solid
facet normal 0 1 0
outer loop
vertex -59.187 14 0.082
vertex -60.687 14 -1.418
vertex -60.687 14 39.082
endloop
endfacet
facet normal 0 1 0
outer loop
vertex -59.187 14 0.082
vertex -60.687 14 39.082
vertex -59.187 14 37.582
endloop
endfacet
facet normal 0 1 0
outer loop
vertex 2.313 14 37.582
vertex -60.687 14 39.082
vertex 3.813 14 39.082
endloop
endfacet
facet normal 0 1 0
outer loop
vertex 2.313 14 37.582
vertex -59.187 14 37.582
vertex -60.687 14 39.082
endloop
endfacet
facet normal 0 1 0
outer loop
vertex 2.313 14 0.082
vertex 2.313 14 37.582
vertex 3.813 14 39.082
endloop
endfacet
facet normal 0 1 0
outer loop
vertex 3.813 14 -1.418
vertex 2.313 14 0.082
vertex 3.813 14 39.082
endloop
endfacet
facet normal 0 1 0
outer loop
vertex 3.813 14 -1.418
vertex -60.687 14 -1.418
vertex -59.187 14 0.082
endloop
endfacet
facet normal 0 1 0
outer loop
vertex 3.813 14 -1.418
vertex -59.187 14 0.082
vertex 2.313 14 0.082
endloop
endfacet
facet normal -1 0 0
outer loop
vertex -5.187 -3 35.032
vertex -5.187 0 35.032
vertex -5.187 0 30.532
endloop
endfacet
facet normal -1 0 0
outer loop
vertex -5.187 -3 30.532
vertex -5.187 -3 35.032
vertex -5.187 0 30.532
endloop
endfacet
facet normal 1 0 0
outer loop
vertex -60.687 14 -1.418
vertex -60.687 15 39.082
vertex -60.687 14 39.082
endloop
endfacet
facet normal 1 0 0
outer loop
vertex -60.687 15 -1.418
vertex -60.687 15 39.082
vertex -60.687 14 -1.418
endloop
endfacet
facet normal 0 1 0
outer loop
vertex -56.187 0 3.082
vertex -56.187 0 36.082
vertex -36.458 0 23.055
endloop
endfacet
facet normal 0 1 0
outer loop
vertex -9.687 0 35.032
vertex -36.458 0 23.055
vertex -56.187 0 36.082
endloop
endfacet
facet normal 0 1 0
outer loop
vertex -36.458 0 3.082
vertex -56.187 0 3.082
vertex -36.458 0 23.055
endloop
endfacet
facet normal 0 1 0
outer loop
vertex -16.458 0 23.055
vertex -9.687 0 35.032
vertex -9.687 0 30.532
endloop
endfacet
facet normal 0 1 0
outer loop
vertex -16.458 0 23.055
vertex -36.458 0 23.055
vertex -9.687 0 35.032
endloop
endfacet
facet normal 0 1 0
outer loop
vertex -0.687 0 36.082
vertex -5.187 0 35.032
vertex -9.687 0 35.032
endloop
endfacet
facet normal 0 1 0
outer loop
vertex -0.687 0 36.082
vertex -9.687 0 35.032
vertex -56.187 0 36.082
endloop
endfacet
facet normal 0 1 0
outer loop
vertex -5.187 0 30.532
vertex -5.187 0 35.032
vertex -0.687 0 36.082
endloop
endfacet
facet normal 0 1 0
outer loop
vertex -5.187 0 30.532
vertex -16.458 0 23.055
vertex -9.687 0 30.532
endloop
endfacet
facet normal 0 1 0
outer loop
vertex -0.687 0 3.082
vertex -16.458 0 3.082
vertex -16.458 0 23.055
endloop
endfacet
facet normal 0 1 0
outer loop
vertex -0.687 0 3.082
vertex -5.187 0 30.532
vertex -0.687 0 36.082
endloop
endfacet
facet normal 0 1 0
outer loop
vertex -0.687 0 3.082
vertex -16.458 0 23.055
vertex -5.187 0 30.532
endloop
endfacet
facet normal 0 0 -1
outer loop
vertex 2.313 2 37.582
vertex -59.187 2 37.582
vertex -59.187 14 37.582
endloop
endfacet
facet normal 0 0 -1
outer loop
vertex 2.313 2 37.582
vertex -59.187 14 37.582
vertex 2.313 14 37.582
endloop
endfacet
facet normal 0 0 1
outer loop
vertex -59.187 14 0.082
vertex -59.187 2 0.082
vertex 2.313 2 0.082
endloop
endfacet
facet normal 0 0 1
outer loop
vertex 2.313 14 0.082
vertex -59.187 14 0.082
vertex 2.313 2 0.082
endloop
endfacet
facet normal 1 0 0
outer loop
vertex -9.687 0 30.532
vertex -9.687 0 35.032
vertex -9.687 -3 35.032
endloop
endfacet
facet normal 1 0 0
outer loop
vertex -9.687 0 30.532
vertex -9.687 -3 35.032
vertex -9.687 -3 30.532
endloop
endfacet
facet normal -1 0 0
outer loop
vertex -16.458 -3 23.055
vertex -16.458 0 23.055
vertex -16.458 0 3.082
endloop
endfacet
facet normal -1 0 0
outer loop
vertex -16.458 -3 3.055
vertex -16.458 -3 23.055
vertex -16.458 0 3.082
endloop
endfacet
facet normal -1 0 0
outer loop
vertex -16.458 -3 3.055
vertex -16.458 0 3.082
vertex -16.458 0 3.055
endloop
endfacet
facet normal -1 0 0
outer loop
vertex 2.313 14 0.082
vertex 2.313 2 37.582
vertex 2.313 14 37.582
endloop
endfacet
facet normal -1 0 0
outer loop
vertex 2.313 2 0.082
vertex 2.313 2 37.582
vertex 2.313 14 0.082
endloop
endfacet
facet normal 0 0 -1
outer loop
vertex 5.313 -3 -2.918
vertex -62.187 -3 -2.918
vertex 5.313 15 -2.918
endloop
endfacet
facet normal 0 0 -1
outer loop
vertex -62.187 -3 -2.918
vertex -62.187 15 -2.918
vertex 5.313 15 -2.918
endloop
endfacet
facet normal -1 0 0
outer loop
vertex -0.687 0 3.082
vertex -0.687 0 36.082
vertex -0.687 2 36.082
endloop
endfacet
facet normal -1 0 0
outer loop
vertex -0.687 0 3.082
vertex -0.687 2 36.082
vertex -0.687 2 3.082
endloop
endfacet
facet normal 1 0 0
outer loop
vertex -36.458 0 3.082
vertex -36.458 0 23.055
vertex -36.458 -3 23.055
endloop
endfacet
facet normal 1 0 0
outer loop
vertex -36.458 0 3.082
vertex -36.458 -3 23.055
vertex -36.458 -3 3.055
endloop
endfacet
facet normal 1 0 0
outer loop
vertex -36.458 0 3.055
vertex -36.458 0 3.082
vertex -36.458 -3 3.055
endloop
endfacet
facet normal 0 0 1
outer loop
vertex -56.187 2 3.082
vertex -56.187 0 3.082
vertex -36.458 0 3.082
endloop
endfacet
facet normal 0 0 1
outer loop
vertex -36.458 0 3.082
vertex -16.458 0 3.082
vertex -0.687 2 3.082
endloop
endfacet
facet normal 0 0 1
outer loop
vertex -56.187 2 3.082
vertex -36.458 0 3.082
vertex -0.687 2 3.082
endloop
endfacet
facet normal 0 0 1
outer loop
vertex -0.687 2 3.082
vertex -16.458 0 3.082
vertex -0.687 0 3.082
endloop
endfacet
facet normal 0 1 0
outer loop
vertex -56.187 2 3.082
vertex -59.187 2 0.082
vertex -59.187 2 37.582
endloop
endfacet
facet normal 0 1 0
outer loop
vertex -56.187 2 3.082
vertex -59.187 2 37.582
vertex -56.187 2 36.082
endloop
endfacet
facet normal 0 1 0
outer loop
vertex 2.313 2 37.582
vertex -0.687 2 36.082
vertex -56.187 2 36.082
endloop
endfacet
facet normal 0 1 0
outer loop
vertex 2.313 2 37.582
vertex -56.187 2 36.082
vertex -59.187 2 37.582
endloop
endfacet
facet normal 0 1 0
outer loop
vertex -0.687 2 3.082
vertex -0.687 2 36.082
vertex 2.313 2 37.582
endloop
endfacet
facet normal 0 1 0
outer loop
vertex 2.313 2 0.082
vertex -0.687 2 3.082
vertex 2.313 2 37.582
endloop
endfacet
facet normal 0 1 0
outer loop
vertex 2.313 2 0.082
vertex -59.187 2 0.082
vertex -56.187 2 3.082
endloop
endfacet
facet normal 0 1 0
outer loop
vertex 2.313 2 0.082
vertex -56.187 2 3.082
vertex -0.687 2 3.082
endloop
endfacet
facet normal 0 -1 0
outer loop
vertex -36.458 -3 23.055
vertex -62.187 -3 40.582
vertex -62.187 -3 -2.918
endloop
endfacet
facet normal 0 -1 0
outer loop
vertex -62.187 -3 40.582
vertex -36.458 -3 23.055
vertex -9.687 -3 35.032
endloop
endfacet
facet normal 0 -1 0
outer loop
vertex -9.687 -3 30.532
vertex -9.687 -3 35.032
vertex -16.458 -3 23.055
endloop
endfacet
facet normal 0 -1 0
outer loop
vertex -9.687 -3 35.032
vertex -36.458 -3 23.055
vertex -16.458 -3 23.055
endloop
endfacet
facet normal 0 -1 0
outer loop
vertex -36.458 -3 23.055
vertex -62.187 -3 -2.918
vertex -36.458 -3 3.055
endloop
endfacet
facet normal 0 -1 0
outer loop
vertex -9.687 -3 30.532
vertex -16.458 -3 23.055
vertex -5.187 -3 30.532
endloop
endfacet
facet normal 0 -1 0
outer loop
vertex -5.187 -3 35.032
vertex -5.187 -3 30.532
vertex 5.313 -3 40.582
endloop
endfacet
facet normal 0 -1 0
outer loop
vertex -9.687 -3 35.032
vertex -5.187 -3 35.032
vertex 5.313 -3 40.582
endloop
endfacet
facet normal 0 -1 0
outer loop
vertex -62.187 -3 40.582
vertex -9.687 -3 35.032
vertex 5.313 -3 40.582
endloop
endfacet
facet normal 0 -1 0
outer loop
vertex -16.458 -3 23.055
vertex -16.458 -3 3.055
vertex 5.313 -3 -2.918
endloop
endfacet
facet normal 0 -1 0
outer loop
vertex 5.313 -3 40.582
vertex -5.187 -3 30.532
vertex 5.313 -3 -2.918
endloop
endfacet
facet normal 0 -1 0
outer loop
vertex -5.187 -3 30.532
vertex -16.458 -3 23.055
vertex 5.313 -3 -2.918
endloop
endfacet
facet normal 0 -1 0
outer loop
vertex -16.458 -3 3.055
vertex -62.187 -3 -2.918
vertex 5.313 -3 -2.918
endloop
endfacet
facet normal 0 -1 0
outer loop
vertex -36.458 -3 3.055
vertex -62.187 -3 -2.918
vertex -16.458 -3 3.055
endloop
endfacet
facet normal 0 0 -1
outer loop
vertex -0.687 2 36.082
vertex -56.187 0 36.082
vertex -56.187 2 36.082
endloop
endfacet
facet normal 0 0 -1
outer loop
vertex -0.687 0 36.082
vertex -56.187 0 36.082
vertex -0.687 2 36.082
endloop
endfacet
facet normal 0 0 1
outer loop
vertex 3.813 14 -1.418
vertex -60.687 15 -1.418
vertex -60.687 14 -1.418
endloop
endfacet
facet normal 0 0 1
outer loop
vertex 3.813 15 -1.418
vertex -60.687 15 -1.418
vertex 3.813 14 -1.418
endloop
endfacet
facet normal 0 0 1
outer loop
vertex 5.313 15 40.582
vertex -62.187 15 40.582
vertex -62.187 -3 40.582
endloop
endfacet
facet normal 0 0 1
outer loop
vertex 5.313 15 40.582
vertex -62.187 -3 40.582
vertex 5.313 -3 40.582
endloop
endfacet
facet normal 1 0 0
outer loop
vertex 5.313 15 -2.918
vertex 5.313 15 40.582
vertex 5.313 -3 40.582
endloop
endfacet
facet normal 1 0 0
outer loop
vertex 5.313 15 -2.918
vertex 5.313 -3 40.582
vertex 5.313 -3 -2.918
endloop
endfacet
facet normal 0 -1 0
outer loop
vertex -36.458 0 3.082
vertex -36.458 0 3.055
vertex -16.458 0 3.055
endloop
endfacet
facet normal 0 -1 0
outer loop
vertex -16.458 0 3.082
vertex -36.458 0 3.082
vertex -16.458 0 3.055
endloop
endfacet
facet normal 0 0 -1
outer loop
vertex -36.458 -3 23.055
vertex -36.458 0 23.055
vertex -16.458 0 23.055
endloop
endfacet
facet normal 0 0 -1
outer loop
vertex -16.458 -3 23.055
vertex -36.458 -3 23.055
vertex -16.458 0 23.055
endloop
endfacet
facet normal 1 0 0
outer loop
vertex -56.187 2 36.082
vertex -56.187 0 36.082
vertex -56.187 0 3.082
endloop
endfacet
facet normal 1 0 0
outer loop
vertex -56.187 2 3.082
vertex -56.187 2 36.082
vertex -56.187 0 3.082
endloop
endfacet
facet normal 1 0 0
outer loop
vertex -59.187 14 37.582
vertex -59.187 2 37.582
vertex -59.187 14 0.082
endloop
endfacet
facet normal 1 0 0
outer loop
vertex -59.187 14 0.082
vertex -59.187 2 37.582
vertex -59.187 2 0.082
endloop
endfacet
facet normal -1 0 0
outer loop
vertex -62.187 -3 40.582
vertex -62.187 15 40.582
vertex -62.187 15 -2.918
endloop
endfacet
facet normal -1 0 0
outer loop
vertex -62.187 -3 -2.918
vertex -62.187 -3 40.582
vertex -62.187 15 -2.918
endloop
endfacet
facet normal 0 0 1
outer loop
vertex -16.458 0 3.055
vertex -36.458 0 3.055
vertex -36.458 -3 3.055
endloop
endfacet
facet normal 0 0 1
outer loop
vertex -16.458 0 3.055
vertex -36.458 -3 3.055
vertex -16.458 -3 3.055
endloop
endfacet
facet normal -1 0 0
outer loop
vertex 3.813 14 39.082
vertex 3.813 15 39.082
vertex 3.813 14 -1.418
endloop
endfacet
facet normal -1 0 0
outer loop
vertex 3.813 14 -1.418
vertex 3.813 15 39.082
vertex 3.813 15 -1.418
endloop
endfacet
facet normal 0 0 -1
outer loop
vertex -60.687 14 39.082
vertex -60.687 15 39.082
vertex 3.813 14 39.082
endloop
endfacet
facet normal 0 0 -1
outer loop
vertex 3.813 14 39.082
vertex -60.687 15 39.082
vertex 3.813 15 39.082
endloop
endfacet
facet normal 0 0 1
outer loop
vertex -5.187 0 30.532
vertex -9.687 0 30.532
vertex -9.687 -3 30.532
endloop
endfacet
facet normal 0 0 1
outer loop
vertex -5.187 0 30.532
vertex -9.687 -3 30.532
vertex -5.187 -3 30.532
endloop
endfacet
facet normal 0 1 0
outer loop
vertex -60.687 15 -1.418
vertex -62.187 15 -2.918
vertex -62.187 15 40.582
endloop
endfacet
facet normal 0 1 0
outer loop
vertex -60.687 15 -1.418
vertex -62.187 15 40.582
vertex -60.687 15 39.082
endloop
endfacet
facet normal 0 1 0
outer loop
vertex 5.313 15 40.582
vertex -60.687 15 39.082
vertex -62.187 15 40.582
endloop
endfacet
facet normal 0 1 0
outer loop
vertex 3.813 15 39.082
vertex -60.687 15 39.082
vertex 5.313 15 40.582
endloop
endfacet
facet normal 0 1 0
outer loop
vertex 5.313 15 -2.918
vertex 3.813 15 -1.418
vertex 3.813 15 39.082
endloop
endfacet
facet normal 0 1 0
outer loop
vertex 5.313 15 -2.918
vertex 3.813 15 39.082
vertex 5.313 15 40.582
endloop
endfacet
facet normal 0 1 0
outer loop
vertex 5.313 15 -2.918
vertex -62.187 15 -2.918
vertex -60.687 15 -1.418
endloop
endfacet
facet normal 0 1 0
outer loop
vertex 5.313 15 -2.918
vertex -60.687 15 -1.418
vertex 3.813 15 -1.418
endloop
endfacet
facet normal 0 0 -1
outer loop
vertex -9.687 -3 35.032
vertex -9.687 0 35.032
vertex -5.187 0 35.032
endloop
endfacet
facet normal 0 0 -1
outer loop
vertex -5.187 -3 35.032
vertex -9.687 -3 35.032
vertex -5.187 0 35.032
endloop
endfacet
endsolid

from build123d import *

# Parameters (mm, degrees)
SKETCH_1_W          = 61.5
SKETCH_1_H          = 37.5
SKETCH_1_W_2        = 55.5
SKETCH_1_H_2        = 33
EXTRUDE_2_DEPTH     = 2
SKETCH_1_4_W        = 67.5
SKETCH_1_4_H        = 43.5
SKETCH_1_4_W_2      = 61.5
SKETCH_1_4_H_2      = 37.5
EXTRUDE_3_DEPTH     = 15
SKETCH_1_5_W        = 67.5
SKETCH_1_5_H        = 43.5
EXTRUDE_4_DEPTH     = 3
CUT_EXTRUDE_1_REACH = 77.757
SKETCH_1_6_W        = 4.5
SKETCH_1_6_H        = 4.5
SKETCH_3_W          = 64.5
SKETCH_3_H          = 40.5
CUT_EXTRUDE_2_DEPTH = 1
SKETCH_4_W          = 20
SKETCH_4_H          = 20
CUT_EXTRUDE_4_DEPTH = 76.757255238


with BuildPart() as part:
    # Эскиз1 → Бобышка-Вытянуть2 (new body)
    with BuildSketch(Plane(origin=(0, 0, 0), x_dir=(1, 0, 0), z_dir=(0, 1, 0))):
        with Locations((-28.437260101, -18.832094604)):
            Rectangle(SKETCH_1_W, SKETCH_1_H)
        with Locations((-28.437260101, -19.582094604)):
            Rectangle(SKETCH_1_W_2, SKETCH_1_H_2, mode=Mode.SUBTRACT)
    extrude(amount=EXTRUDE_2_DEPTH)

    # Эскиз1<4> → Бобышка-Вытянуть3 (add)
    with BuildSketch(Plane(origin=(0, 0, 0), x_dir=(1, 0, 0), z_dir=(0, 1, 0))):
        with Locations((-28.437260101, -18.832094604)):
            Rectangle(SKETCH_1_4_W, SKETCH_1_4_H)
        with Locations((-28.437260101, -18.832094604)):
            Rectangle(SKETCH_1_4_W_2, SKETCH_1_4_H_2, mode=Mode.SUBTRACT)
    extrude(amount=EXTRUDE_3_DEPTH)

    # Эскиз1<5> → Бобышка-Вытянуть4 (add)
    with BuildSketch(Plane(origin=(0, 0, 0), x_dir=(1, 0, 0), z_dir=(0, 1, 0))):
        with Locations((-28.437260101, -18.832094604)):
            Rectangle(SKETCH_1_5_W, SKETCH_1_5_H)
    extrude(amount=-EXTRUDE_4_DEPTH)

    # Эскиз1<6> → Вырез-Вытянуть1 (cut, up to next)
    with BuildSketch(Plane(origin=(0, 0, 0), x_dir=(1, 0, 0), z_dir=(0, 1, 0)), mode=Mode.PRIVATE) as cut_extrude_1_sk1:
        with Locations((-7.437260101, -32.782094604)):
            Rectangle(SKETCH_1_6_W, SKETCH_1_6_H)
    cut_extrude_1_tool1 = extrude(cut_extrude_1_sk1.sketch, amount=-CUT_EXTRUDE_1_REACH, mode=Mode.PRIVATE) & part.part
    add(cut_extrude_1_tool1.solids().sort_by_distance((-7.43726, 0, 32.782095))[0], mode=Mode.SUBTRACT)

    # Эскиз3 → Вырез-Вытянуть2 (cut)
    with BuildSketch(Plane(origin=(0, 15, 0), x_dir=(1, 0, 0), z_dir=(0, 1, 0))):
        with Locations((-28.437260101, -18.832094604)):
            Rectangle(SKETCH_3_W, SKETCH_3_H)
    extrude(amount=-CUT_EXTRUDE_2_DEPTH, mode=Mode.SUBTRACT)

    # Эскиз4 → Вырез-Вытянуть4 (cut, through all)
    with BuildSketch(Plane(origin=(0, 0, 0), x_dir=(1, 0, 0), z_dir=(0, 1, 0))):
        with Locations((-26.4581734, -13.054729736)):
            Rectangle(SKETCH_4_W, SKETCH_4_H)
    extrude(amount=-CUT_EXTRUDE_4_DEPTH, mode=Mode.SUBTRACT)


solid = part.part
